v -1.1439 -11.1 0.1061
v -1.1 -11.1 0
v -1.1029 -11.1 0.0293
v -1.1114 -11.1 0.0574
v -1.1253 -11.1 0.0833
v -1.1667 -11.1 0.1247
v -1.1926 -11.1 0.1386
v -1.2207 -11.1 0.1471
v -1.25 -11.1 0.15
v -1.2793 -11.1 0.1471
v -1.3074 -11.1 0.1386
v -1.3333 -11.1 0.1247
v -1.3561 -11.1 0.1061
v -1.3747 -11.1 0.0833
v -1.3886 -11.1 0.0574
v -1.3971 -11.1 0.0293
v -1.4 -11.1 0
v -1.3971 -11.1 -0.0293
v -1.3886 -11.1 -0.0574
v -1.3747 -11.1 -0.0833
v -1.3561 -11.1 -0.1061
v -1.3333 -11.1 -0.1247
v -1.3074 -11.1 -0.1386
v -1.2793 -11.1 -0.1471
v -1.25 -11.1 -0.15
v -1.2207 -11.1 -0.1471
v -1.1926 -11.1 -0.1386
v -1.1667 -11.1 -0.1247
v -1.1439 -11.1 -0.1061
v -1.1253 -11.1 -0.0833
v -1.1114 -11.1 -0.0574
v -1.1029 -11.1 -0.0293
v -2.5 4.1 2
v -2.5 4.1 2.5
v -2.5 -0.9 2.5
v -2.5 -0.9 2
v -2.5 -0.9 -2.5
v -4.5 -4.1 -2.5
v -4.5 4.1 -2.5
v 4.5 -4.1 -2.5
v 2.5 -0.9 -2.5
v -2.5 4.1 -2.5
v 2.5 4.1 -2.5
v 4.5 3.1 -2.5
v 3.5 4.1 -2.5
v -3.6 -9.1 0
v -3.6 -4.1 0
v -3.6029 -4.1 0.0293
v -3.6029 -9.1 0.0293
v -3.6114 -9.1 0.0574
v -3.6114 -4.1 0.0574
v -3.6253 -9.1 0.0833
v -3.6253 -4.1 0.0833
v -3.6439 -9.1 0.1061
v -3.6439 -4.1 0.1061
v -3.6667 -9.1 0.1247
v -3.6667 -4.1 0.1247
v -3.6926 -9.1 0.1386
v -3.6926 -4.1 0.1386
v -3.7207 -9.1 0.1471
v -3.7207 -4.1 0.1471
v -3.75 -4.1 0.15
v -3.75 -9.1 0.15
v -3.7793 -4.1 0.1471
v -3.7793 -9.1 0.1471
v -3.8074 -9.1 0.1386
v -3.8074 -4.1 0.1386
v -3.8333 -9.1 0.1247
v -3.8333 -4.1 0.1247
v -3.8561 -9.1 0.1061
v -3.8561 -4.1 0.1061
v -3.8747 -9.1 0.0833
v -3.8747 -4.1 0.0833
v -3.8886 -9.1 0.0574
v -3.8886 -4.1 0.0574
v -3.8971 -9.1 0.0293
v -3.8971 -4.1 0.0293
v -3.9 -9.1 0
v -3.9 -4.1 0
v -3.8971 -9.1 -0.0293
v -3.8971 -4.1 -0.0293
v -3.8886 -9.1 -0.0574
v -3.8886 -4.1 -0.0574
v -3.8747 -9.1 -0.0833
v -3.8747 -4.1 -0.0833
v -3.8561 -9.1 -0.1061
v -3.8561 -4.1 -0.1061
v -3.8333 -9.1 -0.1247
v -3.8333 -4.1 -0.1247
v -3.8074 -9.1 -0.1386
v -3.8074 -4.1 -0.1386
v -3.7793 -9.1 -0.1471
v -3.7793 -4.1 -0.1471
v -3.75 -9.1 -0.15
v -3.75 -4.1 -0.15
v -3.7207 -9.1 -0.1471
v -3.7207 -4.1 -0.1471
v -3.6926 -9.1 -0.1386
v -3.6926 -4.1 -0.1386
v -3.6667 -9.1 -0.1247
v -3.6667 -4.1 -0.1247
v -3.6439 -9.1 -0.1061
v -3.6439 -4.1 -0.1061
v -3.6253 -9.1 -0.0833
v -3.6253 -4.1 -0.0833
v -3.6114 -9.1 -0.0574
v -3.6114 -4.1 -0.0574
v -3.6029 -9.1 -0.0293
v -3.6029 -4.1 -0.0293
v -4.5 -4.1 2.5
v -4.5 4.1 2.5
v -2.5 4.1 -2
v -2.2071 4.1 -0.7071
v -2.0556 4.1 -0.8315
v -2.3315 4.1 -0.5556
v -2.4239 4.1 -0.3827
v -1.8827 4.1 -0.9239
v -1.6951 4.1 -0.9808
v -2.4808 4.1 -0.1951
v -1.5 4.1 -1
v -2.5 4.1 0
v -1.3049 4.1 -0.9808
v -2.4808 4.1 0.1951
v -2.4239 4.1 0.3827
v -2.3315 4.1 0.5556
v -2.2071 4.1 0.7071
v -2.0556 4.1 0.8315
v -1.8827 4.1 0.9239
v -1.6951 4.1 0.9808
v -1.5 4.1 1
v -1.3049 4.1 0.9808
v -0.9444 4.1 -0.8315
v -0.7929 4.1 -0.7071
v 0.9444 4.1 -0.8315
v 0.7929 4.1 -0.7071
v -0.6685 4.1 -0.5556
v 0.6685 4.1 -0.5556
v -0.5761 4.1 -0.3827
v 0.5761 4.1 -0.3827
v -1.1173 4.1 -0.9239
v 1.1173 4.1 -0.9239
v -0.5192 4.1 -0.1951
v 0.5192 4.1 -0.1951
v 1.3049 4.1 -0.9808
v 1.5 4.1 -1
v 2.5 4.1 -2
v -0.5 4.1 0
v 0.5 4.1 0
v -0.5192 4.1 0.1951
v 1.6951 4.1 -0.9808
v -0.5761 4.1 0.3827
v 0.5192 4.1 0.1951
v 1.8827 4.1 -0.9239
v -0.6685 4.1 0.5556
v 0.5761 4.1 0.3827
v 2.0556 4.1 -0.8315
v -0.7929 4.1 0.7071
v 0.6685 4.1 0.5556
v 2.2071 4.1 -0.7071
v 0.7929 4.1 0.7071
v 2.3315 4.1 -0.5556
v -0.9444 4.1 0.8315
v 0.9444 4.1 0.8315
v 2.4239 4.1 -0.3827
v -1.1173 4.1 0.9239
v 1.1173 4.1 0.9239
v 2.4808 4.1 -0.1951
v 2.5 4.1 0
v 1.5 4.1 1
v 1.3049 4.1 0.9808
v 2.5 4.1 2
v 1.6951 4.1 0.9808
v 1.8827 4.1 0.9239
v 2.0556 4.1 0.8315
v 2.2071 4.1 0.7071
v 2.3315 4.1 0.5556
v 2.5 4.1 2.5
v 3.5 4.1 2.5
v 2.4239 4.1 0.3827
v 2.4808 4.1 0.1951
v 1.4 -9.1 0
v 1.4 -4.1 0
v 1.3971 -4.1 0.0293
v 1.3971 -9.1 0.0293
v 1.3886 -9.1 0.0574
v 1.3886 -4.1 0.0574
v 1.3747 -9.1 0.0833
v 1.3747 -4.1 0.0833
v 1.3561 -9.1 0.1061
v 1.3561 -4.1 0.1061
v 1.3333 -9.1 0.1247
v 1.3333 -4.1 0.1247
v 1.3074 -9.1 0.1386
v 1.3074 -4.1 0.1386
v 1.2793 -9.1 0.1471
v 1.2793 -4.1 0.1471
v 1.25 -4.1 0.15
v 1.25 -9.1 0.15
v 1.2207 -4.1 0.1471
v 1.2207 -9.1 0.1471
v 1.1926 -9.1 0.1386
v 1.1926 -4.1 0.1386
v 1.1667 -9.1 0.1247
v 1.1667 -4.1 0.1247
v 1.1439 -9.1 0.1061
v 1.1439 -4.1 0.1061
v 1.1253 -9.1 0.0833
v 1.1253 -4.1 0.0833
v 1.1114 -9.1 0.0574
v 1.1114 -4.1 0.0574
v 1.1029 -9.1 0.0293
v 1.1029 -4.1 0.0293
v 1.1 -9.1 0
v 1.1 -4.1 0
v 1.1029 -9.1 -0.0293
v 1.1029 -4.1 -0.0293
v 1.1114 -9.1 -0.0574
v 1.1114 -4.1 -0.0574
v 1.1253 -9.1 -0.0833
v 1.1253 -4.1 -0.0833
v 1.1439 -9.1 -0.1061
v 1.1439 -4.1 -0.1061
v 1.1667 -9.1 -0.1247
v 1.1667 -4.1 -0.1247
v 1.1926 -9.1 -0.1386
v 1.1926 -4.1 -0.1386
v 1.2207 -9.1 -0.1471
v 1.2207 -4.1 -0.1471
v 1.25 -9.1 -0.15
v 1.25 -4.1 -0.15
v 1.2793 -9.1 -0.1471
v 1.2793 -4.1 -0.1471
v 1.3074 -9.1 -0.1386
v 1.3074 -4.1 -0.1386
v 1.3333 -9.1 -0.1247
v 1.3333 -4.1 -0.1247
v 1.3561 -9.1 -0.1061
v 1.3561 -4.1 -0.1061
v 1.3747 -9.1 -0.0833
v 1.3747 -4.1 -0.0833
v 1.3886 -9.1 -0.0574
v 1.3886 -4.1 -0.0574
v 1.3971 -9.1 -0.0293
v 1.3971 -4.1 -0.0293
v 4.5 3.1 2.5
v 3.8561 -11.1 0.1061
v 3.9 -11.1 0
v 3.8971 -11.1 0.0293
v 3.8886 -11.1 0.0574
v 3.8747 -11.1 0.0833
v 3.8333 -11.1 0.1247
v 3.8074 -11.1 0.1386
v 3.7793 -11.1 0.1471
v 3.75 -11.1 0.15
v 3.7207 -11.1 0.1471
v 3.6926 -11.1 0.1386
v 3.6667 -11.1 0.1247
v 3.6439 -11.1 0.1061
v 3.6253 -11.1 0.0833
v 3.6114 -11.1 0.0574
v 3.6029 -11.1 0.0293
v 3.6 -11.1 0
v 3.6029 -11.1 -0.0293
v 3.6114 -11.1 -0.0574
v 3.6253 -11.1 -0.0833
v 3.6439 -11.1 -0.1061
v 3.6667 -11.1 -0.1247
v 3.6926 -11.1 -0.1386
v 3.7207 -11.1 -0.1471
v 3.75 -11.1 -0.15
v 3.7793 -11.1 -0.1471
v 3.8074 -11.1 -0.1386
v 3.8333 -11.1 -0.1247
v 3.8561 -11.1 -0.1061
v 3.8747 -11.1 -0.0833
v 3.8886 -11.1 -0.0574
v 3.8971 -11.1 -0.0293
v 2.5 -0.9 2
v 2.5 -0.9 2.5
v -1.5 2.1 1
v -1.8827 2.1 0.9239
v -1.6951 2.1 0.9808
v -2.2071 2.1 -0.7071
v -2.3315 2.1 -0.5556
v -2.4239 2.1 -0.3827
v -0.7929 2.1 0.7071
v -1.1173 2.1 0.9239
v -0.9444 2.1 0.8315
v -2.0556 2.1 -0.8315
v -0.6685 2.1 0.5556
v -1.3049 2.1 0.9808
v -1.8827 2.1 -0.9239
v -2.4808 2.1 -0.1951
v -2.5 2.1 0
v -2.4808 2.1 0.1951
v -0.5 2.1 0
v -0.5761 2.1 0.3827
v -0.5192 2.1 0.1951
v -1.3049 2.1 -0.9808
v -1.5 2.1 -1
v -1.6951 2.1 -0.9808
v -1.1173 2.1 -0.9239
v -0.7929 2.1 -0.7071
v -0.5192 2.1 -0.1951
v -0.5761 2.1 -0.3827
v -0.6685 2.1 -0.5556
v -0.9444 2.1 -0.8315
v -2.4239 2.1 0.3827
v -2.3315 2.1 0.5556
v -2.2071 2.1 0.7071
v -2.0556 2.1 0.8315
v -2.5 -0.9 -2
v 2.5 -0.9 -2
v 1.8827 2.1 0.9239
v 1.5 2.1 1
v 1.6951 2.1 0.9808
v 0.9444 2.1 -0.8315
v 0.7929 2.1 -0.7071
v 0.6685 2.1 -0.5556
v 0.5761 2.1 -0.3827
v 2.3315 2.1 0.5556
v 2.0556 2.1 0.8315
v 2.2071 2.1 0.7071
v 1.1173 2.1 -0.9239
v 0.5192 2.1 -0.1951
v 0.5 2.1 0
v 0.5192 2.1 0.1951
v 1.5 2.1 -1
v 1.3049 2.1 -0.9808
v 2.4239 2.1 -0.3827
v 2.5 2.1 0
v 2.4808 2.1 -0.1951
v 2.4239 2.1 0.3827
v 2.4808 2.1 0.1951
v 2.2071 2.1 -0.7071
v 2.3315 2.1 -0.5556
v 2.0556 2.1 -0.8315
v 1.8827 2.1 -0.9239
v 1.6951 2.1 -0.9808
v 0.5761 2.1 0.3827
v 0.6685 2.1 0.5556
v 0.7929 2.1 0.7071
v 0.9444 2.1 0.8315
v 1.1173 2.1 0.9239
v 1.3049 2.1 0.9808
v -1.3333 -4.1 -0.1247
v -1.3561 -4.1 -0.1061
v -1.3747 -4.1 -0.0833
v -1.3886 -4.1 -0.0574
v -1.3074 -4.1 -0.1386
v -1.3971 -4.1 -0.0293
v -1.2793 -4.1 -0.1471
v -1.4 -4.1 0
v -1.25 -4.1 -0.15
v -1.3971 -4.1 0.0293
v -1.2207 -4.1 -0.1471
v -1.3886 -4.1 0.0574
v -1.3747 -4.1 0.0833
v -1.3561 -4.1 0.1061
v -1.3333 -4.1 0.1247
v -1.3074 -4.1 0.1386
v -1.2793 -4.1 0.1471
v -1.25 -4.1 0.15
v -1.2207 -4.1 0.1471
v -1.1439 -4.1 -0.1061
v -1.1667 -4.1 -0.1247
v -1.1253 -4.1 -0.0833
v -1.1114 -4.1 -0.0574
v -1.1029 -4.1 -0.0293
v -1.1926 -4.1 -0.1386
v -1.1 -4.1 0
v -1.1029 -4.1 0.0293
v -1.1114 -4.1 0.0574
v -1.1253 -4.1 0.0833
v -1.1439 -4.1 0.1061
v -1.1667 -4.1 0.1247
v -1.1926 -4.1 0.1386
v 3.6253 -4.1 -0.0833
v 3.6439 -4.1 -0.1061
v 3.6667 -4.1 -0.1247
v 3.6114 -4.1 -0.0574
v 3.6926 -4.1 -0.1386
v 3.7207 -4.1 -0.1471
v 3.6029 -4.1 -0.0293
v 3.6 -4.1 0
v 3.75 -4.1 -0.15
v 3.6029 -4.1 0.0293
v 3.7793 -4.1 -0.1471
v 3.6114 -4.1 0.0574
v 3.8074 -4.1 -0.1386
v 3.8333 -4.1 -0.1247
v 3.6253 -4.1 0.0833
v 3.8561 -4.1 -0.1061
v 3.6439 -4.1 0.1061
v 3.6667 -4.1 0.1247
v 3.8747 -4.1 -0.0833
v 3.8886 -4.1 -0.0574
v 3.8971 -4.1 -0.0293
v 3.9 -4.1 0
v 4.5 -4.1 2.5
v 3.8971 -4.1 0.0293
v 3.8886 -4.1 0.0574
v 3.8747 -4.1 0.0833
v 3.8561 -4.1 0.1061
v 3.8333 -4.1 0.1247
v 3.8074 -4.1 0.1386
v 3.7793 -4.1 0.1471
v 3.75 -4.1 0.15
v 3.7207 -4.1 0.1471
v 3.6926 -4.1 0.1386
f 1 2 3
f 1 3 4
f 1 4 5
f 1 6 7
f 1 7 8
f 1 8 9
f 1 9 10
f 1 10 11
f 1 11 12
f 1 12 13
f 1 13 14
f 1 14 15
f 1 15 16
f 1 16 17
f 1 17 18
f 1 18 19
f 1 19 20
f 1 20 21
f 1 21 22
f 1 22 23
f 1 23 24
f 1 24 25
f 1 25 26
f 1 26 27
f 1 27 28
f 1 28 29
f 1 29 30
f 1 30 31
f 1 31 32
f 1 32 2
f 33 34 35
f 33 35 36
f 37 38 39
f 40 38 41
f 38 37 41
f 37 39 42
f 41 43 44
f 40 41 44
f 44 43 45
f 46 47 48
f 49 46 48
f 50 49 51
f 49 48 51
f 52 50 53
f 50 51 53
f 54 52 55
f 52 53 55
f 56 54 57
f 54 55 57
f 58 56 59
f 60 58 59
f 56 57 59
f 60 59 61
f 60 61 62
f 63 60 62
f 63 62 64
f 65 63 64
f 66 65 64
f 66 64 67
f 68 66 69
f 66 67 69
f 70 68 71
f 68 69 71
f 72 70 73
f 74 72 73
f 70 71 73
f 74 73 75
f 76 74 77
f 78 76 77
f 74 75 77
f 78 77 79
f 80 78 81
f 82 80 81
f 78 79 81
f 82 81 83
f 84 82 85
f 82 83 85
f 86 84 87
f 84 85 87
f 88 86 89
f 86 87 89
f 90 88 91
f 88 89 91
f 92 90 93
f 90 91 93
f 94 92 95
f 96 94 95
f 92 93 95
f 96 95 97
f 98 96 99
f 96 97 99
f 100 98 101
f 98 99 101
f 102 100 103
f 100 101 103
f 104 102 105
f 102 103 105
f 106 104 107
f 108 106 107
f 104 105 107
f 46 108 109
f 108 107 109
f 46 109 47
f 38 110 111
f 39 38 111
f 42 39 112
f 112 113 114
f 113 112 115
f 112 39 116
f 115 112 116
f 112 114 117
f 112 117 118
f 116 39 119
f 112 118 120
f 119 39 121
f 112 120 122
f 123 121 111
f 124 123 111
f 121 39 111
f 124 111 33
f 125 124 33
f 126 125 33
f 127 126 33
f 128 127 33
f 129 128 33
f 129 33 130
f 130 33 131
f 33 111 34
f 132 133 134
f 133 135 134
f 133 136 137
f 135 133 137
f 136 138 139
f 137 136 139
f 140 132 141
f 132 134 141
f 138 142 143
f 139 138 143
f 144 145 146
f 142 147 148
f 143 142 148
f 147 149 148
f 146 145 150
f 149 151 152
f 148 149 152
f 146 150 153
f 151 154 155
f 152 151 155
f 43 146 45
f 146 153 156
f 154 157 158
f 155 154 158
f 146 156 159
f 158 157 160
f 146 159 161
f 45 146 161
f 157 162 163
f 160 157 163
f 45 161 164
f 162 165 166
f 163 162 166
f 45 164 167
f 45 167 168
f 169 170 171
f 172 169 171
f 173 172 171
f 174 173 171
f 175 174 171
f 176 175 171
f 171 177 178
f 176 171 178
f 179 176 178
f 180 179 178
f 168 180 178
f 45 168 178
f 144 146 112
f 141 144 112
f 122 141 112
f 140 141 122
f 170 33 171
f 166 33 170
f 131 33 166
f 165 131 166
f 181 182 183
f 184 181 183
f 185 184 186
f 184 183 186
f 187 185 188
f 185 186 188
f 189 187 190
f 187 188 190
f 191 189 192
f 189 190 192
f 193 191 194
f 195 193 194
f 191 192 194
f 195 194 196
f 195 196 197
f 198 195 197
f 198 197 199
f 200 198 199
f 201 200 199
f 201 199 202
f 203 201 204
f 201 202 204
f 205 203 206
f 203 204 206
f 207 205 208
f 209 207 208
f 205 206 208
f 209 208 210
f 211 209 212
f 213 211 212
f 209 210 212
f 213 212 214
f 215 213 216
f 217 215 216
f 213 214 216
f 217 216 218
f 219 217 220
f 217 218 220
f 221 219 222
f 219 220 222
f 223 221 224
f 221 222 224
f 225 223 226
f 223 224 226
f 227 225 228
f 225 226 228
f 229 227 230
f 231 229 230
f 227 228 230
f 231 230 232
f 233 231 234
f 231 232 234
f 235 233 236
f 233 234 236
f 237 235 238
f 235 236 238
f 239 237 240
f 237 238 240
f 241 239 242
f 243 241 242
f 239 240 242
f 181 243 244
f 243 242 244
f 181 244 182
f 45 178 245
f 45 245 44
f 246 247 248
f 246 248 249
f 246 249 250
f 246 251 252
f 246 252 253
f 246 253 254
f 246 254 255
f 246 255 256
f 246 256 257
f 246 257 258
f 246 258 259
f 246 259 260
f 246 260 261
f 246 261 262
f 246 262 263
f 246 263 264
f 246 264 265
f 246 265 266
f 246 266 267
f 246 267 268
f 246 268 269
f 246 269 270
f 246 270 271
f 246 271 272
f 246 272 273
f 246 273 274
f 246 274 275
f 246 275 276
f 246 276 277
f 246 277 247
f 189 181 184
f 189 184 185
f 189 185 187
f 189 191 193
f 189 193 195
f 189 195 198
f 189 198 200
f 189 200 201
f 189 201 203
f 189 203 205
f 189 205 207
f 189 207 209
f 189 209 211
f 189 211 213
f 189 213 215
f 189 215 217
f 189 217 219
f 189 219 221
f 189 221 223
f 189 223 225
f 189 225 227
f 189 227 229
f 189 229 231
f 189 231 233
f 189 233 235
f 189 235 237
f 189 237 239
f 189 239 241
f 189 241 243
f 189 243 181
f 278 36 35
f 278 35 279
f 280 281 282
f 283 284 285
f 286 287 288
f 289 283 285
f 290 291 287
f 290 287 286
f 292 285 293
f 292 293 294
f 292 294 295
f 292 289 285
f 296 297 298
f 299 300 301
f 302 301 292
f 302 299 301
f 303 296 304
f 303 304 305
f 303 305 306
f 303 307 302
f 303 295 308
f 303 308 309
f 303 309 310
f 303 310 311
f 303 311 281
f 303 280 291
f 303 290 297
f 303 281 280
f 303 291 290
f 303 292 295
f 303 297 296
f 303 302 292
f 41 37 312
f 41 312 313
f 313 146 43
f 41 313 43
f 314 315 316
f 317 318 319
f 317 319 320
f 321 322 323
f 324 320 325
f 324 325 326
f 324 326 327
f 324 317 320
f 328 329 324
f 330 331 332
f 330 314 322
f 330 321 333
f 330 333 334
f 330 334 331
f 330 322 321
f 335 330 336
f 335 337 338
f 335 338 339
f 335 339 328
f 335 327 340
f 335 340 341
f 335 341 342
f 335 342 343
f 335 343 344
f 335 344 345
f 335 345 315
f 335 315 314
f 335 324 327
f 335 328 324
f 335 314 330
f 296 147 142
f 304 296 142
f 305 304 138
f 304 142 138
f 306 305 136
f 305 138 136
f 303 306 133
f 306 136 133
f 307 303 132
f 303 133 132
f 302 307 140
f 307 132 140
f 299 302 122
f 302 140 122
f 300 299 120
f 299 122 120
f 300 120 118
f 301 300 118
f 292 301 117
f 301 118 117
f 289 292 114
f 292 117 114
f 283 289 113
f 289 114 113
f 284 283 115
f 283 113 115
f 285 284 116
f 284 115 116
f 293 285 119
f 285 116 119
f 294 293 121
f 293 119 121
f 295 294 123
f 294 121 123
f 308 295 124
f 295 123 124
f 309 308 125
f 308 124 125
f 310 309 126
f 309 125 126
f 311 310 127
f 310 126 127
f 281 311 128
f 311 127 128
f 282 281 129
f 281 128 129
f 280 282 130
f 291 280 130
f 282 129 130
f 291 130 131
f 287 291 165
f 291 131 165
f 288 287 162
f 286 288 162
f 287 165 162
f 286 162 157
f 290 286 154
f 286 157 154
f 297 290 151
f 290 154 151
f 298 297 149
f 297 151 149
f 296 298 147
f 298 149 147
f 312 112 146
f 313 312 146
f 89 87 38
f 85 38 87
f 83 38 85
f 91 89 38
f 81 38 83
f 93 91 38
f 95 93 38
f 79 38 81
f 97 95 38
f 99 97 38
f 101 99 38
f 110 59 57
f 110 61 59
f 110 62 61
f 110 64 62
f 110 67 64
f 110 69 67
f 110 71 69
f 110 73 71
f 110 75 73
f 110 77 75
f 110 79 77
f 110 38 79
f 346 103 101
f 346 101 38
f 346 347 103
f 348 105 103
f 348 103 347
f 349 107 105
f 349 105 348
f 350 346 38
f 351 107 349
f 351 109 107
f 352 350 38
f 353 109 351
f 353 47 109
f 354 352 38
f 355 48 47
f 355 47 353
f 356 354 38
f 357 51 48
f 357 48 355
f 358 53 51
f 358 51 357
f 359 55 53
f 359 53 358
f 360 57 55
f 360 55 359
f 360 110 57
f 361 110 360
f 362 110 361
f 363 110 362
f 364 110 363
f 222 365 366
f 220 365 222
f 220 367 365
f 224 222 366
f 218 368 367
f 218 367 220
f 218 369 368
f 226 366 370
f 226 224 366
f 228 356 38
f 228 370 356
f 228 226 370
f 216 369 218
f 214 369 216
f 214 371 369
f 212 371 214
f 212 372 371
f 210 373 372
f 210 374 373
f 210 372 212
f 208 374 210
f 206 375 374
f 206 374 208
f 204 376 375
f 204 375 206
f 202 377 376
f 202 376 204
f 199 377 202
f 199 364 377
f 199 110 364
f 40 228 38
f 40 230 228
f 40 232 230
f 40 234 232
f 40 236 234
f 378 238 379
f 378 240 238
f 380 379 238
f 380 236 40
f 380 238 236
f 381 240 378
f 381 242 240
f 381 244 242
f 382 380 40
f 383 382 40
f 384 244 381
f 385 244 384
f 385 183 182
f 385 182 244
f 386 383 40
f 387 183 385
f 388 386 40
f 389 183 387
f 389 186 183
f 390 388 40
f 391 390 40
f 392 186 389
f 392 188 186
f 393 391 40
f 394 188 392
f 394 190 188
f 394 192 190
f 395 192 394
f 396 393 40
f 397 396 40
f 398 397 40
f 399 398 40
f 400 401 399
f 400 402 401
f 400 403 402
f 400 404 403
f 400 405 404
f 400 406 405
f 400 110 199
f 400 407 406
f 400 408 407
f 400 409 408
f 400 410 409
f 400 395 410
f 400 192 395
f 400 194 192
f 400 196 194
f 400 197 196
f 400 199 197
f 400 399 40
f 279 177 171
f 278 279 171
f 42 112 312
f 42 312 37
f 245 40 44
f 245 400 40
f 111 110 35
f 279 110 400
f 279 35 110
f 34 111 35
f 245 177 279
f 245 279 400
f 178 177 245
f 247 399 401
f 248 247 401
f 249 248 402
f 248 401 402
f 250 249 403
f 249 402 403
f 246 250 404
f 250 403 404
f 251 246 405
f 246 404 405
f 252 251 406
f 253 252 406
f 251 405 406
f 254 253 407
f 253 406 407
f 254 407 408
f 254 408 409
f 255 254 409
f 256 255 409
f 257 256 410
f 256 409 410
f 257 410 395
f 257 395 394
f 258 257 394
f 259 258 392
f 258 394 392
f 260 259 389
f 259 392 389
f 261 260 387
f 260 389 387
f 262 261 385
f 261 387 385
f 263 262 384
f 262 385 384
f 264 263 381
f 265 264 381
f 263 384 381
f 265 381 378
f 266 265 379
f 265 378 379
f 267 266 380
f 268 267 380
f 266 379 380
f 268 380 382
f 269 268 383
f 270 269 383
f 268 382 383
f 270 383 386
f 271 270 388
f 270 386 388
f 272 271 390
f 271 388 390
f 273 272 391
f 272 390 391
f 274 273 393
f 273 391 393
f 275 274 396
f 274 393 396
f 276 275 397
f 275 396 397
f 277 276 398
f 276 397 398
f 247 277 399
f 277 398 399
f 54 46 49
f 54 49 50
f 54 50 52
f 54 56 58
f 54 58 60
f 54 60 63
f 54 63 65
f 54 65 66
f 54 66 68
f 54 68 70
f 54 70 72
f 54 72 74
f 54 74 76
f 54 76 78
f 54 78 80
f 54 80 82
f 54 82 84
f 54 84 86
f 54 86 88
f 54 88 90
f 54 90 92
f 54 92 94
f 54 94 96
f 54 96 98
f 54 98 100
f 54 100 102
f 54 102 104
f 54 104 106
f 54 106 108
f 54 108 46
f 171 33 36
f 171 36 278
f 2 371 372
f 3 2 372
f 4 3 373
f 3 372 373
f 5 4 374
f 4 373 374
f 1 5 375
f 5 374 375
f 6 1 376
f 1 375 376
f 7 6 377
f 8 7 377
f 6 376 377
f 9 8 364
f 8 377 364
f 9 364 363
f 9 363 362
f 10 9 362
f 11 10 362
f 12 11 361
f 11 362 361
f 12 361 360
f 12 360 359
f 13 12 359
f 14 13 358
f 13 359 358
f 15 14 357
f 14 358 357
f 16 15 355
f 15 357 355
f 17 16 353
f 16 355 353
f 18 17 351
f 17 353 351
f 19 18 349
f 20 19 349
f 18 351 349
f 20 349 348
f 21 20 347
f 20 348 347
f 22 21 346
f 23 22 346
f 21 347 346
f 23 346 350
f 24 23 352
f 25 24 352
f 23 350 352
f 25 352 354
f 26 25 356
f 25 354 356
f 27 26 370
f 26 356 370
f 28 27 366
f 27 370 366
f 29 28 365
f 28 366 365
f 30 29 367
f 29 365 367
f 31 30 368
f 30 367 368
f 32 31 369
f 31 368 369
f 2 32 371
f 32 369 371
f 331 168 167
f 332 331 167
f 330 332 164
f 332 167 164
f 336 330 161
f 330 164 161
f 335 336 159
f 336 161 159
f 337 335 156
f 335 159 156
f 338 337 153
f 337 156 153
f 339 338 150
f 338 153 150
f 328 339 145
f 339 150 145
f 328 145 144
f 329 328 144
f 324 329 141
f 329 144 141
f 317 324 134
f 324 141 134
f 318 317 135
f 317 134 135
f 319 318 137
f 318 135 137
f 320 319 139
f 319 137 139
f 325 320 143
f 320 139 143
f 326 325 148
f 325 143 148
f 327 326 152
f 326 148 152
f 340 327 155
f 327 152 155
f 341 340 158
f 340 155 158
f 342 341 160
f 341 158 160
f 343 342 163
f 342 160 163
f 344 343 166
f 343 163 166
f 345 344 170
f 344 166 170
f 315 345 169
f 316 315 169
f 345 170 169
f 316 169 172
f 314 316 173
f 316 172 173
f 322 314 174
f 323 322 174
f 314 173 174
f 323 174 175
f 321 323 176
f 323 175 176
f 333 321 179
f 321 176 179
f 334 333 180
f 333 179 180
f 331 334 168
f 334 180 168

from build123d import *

# Parameters (mm, degrees)
SKETCH1_W           = 9
SKETCH1_H           = 8.2
BOSS_EXTRUDE1_DEPTH = 2.5
CHAMFER1_SIZE       = 1
SKETCH2_W           = 5
SKETCH2_H           = 0.5
CUT_EXTRUDE1_DEPTH  = 5
SKETCH3_R           = 1
CUT_EXTRUDE2_DEPTH  = 2
SKETCH4_R           = 0.15
BOSS_EXTRUDE2_DEPTH = 5
SKETCH5_R           = 0.15
BOSS_EXTRUDE3_DEPTH = 7


with BuildPart() as part:
    # Sketch1 → Boss-Extrude1 (new body, symmetric)
    with BuildSketch(Plane.XY):
        Rectangle(SKETCH1_W, SKETCH1_H)
    extrude(amount=BOSS_EXTRUDE1_DEPTH, both=True)

    # Chamfer1
    chamfer1_edges = [part.edges().sort_by_distance(p)[0] for p in [
        (4.5, 4.1, 0),
    ]]
    chamfer(chamfer1_edges, length=CHAMFER1_SIZE)

    # Sketch2 → Cut-Extrude1 (cut)
    with BuildSketch(Plane(origin=(0, 4.1, 0), x_dir=(1, 0, 0), z_dir=(0, 1, 0))):
        with Locations((0, -2.25)):
            Rectangle(SKETCH2_W, SKETCH2_H)
        with Locations((0, 2.25)):
            Rectangle(SKETCH2_W, SKETCH2_H)
    extrude(amount=-CUT_EXTRUDE1_DEPTH, mode=Mode.SUBTRACT)

    # Sketch3 → Cut-Extrude2 (cut)
    with BuildSketch(Plane(origin=(0, 4.1, 0), x_dir=(1, 0, 0), z_dir=(0, 1, 0))):
        with Locations((1.5, 0)):
            Circle(SKETCH3_R)
        with Locations((-1.5, 0)):
            Circle(SKETCH3_R)
    extrude(amount=-CUT_EXTRUDE2_DEPTH, mode=Mode.SUBTRACT)

    # Sketch4 → Boss-Extrude2 (add)
    with BuildSketch(Plane.XZ.offset(4.1)):
        with Locations((1.25, 0)):
            Circle(SKETCH4_R)
        with Locations((-3.75, 0)):
            Circle(SKETCH4_R)
    extrude(amount=BOSS_EXTRUDE2_DEPTH)

    # Sketch5 → Boss-Extrude3 (add)
    with BuildSketch(Plane.XZ.offset(4.1)):
        with Locations((-1.25, 0)):
            Circle(SKETCH5_R)
        with Locations((3.75, 0)):
            Circle(SKETCH5_R)
    extrude(amount=BOSS_EXTRUDE3_DEPTH)


solid = part.part
